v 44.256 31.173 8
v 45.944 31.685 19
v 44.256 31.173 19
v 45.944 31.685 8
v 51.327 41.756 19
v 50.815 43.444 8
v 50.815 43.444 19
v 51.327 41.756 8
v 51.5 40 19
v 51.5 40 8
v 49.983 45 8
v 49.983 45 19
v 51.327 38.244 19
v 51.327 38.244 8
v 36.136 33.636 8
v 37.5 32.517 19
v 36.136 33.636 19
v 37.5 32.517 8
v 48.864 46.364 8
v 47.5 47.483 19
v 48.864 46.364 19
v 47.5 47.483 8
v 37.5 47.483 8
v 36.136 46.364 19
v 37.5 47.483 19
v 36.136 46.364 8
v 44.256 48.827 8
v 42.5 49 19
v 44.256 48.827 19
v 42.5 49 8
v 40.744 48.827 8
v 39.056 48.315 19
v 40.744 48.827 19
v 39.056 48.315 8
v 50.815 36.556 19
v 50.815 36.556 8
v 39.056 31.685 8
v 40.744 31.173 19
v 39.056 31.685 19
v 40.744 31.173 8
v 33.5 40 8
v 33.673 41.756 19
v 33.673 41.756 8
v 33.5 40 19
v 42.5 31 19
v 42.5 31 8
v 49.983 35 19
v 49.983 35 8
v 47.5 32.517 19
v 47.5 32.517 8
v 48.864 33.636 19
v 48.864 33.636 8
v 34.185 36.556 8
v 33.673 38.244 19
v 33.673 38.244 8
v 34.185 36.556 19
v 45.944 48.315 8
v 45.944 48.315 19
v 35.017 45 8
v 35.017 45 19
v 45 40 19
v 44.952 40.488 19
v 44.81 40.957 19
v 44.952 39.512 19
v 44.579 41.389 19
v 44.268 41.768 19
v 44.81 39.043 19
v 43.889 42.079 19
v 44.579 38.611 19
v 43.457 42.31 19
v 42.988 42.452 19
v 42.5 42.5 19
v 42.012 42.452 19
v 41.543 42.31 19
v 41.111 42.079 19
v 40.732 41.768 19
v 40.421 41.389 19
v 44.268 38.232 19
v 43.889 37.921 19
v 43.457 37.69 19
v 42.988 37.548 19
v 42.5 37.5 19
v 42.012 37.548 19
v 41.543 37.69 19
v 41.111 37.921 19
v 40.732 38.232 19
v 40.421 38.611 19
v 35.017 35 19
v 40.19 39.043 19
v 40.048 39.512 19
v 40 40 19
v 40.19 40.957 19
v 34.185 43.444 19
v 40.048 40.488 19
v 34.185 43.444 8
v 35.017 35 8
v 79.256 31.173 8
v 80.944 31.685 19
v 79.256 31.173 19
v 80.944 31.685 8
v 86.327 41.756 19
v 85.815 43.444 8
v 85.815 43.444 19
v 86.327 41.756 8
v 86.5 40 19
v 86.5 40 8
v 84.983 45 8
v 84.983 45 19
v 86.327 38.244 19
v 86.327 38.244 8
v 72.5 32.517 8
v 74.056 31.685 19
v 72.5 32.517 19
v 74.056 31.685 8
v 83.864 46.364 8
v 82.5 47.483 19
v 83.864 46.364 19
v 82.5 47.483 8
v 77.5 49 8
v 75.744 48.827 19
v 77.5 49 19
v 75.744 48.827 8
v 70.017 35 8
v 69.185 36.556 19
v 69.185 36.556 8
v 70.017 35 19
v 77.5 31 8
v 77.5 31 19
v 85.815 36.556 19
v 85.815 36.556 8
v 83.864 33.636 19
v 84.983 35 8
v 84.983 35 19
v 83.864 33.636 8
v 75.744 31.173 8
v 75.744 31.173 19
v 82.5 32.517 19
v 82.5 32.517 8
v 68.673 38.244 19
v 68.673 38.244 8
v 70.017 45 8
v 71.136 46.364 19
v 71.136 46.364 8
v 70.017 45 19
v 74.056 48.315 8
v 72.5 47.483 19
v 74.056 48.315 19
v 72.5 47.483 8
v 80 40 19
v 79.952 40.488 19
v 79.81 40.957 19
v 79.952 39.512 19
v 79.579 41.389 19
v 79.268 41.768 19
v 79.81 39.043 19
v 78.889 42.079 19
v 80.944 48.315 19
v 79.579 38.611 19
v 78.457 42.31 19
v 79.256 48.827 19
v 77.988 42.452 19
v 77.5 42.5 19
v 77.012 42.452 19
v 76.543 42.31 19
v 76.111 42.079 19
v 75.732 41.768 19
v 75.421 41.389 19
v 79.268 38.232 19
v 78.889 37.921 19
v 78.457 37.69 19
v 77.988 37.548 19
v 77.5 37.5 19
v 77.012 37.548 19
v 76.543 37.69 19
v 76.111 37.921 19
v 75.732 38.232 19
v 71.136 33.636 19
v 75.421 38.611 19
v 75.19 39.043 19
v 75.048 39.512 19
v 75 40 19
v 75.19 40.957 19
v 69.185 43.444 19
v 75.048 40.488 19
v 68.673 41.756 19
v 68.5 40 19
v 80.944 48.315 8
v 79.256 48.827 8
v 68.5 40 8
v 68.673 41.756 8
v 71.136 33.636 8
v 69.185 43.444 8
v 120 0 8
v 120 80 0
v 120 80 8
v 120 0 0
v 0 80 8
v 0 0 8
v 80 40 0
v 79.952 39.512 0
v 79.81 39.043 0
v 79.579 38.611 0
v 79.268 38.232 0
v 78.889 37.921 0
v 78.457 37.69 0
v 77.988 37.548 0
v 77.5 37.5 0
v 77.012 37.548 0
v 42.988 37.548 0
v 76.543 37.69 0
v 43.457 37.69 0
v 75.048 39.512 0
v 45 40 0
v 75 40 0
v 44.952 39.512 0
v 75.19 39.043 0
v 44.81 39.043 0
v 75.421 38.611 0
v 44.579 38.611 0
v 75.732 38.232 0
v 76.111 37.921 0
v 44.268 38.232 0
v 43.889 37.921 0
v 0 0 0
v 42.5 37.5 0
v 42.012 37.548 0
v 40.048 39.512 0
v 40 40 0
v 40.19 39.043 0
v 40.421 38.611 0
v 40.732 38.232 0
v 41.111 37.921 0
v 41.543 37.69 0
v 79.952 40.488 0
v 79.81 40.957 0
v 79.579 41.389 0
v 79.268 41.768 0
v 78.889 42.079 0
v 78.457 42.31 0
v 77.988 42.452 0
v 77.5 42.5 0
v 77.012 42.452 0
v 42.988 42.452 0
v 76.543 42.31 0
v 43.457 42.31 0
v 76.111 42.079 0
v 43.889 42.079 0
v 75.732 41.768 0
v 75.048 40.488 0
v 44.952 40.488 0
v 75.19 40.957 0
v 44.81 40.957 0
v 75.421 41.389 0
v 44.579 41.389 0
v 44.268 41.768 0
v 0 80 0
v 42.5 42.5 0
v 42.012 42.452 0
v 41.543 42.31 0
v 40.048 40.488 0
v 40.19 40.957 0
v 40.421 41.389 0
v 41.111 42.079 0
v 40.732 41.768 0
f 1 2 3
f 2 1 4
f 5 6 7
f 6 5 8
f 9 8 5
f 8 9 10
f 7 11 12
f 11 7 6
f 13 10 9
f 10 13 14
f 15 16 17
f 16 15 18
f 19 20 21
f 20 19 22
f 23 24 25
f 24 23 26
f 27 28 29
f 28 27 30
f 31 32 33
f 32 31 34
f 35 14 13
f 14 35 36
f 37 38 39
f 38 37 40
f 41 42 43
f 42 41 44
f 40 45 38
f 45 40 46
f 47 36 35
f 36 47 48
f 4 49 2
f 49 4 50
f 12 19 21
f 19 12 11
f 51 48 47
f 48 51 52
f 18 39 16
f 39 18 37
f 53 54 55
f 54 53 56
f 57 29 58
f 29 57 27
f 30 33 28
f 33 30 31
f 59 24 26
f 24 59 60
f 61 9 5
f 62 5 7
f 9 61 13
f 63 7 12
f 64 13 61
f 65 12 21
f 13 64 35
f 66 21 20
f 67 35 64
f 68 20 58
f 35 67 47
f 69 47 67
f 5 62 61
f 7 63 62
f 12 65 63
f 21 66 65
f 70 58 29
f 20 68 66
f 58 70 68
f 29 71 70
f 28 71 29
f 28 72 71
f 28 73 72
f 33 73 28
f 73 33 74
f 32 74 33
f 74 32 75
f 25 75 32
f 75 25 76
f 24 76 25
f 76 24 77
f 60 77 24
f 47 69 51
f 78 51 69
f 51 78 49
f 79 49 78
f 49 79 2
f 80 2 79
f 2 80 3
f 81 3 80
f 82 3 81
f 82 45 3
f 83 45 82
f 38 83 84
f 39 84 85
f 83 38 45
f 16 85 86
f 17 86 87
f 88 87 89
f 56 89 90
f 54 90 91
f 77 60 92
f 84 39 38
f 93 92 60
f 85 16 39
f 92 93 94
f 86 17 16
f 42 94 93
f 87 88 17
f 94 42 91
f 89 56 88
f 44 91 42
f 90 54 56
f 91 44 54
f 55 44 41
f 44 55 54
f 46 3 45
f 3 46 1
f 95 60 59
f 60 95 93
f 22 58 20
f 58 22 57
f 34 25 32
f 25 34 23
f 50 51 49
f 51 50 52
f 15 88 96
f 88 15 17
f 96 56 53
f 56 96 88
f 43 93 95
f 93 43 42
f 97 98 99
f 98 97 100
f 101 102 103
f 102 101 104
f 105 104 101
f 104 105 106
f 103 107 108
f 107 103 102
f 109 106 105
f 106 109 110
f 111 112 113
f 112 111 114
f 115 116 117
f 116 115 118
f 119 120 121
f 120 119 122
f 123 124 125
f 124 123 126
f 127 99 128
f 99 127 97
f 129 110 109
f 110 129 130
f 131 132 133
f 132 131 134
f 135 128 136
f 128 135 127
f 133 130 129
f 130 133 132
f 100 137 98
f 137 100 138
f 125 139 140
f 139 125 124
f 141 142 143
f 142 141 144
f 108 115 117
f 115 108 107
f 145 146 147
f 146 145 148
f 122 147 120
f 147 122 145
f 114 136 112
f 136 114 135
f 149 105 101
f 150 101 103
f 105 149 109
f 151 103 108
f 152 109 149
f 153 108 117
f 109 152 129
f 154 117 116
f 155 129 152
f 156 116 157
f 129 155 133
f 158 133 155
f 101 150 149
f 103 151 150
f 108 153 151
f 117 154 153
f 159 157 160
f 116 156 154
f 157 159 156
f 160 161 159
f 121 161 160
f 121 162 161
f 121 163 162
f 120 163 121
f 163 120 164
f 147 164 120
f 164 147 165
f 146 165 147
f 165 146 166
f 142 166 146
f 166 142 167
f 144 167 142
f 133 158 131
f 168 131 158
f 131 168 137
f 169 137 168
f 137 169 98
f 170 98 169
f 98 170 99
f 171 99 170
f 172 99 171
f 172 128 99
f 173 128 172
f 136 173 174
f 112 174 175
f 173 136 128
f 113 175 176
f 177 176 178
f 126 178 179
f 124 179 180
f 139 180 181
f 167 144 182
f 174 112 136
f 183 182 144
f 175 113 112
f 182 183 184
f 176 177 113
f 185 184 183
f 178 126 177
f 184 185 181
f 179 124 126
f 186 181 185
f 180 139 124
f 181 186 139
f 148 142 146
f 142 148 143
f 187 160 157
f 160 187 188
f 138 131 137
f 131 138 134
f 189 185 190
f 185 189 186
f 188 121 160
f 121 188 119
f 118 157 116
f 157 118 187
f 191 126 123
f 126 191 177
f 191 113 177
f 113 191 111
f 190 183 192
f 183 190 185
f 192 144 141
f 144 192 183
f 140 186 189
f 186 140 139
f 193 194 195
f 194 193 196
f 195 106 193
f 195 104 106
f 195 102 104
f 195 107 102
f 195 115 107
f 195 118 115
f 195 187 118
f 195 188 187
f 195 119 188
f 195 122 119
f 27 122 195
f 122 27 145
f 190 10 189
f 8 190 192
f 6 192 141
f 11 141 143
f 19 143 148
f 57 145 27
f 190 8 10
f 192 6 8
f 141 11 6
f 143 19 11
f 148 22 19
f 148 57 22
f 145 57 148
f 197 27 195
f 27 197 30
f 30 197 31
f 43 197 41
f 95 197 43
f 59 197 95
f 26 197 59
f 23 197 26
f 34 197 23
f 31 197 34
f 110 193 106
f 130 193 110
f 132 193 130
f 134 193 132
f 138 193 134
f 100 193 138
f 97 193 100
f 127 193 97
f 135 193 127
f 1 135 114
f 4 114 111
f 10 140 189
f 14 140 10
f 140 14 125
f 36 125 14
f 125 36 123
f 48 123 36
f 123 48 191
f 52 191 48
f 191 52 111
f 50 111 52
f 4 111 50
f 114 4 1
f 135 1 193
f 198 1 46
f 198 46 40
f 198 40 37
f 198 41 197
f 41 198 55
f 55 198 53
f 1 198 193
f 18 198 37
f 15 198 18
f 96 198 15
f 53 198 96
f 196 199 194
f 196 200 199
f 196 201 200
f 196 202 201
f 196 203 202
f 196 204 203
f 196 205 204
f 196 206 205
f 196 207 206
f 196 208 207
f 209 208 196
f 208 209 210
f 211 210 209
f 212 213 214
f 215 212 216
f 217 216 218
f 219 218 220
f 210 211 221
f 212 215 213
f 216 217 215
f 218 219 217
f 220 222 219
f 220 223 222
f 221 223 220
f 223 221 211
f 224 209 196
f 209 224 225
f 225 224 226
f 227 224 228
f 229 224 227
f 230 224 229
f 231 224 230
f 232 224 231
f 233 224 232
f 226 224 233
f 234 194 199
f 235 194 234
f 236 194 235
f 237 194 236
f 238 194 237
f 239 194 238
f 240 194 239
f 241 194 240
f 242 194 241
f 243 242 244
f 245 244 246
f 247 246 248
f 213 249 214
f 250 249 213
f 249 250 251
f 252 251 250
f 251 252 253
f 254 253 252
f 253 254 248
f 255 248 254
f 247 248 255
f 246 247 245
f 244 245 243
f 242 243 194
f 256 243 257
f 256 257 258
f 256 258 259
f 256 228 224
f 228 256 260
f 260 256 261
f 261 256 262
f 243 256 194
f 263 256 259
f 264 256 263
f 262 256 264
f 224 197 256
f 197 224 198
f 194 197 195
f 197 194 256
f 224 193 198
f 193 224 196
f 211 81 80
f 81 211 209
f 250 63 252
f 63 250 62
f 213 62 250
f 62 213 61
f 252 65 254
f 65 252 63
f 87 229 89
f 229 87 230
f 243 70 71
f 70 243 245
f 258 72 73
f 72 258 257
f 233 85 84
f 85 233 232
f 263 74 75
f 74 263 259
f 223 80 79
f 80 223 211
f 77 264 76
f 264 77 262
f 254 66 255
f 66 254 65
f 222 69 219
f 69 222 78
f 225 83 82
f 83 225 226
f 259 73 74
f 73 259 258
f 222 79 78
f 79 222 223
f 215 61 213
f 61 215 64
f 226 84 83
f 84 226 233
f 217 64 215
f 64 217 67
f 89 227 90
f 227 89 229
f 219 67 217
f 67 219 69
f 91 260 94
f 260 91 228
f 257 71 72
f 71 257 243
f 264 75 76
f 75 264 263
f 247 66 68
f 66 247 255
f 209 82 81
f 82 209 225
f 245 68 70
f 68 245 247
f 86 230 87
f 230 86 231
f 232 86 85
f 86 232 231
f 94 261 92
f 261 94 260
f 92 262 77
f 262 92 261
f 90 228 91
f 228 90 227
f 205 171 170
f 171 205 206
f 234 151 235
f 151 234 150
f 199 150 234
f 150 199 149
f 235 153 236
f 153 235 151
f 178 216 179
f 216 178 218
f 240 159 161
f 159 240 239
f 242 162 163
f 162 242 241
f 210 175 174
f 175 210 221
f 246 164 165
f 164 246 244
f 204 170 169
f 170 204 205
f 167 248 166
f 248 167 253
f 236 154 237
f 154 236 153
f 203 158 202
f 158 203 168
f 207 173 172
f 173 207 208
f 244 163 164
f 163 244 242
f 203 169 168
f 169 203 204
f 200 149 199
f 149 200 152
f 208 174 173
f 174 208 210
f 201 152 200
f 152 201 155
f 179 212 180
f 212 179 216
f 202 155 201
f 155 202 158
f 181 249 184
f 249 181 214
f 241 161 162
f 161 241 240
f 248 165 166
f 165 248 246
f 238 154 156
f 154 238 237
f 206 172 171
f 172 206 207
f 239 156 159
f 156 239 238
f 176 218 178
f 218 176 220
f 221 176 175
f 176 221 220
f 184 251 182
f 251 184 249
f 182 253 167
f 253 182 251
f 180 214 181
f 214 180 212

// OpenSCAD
$fn = 32;

// ----------------------------------------------------------------------
// Drill jig: two_boss jig
// ----------------------------------------------------------------------

// --- parameters (mm) ---
plate_l = 120;            // plate length, X
plate_w = 80;             // plate width, Y
plate_t = 8;              // plate thickness
boss_d = 18;              // guide boss diameter
boss_h = 12;              // boss height above the plate
guide_d = 5;              // guide hole diameter
boss_pitch = 35;          // boss pitch

n_boss = 2;  // guide bosses
boss_x0 = (plate_l - (n_boss - 1) * boss_pitch) / 2;  // first boss X
boss_top = plate_t - 1 + boss_h;  // boss crown height
total_h = boss_top;  // overall height

difference() {
  union() {
  cube([plate_l, plate_w, plate_t]);
  for (i = [0 : n_boss - 1])
    translate([boss_x0 + i * boss_pitch, plate_w / 2, plate_t - 1])
      cylinder(h = boss_h, d = boss_d);
  }
  for (i = [0 : n_boss - 1])
    translate([boss_x0 + i * boss_pitch, plate_w / 2, -1])
      cylinder(h = plate_t + boss_h, d = guide_d);
}
